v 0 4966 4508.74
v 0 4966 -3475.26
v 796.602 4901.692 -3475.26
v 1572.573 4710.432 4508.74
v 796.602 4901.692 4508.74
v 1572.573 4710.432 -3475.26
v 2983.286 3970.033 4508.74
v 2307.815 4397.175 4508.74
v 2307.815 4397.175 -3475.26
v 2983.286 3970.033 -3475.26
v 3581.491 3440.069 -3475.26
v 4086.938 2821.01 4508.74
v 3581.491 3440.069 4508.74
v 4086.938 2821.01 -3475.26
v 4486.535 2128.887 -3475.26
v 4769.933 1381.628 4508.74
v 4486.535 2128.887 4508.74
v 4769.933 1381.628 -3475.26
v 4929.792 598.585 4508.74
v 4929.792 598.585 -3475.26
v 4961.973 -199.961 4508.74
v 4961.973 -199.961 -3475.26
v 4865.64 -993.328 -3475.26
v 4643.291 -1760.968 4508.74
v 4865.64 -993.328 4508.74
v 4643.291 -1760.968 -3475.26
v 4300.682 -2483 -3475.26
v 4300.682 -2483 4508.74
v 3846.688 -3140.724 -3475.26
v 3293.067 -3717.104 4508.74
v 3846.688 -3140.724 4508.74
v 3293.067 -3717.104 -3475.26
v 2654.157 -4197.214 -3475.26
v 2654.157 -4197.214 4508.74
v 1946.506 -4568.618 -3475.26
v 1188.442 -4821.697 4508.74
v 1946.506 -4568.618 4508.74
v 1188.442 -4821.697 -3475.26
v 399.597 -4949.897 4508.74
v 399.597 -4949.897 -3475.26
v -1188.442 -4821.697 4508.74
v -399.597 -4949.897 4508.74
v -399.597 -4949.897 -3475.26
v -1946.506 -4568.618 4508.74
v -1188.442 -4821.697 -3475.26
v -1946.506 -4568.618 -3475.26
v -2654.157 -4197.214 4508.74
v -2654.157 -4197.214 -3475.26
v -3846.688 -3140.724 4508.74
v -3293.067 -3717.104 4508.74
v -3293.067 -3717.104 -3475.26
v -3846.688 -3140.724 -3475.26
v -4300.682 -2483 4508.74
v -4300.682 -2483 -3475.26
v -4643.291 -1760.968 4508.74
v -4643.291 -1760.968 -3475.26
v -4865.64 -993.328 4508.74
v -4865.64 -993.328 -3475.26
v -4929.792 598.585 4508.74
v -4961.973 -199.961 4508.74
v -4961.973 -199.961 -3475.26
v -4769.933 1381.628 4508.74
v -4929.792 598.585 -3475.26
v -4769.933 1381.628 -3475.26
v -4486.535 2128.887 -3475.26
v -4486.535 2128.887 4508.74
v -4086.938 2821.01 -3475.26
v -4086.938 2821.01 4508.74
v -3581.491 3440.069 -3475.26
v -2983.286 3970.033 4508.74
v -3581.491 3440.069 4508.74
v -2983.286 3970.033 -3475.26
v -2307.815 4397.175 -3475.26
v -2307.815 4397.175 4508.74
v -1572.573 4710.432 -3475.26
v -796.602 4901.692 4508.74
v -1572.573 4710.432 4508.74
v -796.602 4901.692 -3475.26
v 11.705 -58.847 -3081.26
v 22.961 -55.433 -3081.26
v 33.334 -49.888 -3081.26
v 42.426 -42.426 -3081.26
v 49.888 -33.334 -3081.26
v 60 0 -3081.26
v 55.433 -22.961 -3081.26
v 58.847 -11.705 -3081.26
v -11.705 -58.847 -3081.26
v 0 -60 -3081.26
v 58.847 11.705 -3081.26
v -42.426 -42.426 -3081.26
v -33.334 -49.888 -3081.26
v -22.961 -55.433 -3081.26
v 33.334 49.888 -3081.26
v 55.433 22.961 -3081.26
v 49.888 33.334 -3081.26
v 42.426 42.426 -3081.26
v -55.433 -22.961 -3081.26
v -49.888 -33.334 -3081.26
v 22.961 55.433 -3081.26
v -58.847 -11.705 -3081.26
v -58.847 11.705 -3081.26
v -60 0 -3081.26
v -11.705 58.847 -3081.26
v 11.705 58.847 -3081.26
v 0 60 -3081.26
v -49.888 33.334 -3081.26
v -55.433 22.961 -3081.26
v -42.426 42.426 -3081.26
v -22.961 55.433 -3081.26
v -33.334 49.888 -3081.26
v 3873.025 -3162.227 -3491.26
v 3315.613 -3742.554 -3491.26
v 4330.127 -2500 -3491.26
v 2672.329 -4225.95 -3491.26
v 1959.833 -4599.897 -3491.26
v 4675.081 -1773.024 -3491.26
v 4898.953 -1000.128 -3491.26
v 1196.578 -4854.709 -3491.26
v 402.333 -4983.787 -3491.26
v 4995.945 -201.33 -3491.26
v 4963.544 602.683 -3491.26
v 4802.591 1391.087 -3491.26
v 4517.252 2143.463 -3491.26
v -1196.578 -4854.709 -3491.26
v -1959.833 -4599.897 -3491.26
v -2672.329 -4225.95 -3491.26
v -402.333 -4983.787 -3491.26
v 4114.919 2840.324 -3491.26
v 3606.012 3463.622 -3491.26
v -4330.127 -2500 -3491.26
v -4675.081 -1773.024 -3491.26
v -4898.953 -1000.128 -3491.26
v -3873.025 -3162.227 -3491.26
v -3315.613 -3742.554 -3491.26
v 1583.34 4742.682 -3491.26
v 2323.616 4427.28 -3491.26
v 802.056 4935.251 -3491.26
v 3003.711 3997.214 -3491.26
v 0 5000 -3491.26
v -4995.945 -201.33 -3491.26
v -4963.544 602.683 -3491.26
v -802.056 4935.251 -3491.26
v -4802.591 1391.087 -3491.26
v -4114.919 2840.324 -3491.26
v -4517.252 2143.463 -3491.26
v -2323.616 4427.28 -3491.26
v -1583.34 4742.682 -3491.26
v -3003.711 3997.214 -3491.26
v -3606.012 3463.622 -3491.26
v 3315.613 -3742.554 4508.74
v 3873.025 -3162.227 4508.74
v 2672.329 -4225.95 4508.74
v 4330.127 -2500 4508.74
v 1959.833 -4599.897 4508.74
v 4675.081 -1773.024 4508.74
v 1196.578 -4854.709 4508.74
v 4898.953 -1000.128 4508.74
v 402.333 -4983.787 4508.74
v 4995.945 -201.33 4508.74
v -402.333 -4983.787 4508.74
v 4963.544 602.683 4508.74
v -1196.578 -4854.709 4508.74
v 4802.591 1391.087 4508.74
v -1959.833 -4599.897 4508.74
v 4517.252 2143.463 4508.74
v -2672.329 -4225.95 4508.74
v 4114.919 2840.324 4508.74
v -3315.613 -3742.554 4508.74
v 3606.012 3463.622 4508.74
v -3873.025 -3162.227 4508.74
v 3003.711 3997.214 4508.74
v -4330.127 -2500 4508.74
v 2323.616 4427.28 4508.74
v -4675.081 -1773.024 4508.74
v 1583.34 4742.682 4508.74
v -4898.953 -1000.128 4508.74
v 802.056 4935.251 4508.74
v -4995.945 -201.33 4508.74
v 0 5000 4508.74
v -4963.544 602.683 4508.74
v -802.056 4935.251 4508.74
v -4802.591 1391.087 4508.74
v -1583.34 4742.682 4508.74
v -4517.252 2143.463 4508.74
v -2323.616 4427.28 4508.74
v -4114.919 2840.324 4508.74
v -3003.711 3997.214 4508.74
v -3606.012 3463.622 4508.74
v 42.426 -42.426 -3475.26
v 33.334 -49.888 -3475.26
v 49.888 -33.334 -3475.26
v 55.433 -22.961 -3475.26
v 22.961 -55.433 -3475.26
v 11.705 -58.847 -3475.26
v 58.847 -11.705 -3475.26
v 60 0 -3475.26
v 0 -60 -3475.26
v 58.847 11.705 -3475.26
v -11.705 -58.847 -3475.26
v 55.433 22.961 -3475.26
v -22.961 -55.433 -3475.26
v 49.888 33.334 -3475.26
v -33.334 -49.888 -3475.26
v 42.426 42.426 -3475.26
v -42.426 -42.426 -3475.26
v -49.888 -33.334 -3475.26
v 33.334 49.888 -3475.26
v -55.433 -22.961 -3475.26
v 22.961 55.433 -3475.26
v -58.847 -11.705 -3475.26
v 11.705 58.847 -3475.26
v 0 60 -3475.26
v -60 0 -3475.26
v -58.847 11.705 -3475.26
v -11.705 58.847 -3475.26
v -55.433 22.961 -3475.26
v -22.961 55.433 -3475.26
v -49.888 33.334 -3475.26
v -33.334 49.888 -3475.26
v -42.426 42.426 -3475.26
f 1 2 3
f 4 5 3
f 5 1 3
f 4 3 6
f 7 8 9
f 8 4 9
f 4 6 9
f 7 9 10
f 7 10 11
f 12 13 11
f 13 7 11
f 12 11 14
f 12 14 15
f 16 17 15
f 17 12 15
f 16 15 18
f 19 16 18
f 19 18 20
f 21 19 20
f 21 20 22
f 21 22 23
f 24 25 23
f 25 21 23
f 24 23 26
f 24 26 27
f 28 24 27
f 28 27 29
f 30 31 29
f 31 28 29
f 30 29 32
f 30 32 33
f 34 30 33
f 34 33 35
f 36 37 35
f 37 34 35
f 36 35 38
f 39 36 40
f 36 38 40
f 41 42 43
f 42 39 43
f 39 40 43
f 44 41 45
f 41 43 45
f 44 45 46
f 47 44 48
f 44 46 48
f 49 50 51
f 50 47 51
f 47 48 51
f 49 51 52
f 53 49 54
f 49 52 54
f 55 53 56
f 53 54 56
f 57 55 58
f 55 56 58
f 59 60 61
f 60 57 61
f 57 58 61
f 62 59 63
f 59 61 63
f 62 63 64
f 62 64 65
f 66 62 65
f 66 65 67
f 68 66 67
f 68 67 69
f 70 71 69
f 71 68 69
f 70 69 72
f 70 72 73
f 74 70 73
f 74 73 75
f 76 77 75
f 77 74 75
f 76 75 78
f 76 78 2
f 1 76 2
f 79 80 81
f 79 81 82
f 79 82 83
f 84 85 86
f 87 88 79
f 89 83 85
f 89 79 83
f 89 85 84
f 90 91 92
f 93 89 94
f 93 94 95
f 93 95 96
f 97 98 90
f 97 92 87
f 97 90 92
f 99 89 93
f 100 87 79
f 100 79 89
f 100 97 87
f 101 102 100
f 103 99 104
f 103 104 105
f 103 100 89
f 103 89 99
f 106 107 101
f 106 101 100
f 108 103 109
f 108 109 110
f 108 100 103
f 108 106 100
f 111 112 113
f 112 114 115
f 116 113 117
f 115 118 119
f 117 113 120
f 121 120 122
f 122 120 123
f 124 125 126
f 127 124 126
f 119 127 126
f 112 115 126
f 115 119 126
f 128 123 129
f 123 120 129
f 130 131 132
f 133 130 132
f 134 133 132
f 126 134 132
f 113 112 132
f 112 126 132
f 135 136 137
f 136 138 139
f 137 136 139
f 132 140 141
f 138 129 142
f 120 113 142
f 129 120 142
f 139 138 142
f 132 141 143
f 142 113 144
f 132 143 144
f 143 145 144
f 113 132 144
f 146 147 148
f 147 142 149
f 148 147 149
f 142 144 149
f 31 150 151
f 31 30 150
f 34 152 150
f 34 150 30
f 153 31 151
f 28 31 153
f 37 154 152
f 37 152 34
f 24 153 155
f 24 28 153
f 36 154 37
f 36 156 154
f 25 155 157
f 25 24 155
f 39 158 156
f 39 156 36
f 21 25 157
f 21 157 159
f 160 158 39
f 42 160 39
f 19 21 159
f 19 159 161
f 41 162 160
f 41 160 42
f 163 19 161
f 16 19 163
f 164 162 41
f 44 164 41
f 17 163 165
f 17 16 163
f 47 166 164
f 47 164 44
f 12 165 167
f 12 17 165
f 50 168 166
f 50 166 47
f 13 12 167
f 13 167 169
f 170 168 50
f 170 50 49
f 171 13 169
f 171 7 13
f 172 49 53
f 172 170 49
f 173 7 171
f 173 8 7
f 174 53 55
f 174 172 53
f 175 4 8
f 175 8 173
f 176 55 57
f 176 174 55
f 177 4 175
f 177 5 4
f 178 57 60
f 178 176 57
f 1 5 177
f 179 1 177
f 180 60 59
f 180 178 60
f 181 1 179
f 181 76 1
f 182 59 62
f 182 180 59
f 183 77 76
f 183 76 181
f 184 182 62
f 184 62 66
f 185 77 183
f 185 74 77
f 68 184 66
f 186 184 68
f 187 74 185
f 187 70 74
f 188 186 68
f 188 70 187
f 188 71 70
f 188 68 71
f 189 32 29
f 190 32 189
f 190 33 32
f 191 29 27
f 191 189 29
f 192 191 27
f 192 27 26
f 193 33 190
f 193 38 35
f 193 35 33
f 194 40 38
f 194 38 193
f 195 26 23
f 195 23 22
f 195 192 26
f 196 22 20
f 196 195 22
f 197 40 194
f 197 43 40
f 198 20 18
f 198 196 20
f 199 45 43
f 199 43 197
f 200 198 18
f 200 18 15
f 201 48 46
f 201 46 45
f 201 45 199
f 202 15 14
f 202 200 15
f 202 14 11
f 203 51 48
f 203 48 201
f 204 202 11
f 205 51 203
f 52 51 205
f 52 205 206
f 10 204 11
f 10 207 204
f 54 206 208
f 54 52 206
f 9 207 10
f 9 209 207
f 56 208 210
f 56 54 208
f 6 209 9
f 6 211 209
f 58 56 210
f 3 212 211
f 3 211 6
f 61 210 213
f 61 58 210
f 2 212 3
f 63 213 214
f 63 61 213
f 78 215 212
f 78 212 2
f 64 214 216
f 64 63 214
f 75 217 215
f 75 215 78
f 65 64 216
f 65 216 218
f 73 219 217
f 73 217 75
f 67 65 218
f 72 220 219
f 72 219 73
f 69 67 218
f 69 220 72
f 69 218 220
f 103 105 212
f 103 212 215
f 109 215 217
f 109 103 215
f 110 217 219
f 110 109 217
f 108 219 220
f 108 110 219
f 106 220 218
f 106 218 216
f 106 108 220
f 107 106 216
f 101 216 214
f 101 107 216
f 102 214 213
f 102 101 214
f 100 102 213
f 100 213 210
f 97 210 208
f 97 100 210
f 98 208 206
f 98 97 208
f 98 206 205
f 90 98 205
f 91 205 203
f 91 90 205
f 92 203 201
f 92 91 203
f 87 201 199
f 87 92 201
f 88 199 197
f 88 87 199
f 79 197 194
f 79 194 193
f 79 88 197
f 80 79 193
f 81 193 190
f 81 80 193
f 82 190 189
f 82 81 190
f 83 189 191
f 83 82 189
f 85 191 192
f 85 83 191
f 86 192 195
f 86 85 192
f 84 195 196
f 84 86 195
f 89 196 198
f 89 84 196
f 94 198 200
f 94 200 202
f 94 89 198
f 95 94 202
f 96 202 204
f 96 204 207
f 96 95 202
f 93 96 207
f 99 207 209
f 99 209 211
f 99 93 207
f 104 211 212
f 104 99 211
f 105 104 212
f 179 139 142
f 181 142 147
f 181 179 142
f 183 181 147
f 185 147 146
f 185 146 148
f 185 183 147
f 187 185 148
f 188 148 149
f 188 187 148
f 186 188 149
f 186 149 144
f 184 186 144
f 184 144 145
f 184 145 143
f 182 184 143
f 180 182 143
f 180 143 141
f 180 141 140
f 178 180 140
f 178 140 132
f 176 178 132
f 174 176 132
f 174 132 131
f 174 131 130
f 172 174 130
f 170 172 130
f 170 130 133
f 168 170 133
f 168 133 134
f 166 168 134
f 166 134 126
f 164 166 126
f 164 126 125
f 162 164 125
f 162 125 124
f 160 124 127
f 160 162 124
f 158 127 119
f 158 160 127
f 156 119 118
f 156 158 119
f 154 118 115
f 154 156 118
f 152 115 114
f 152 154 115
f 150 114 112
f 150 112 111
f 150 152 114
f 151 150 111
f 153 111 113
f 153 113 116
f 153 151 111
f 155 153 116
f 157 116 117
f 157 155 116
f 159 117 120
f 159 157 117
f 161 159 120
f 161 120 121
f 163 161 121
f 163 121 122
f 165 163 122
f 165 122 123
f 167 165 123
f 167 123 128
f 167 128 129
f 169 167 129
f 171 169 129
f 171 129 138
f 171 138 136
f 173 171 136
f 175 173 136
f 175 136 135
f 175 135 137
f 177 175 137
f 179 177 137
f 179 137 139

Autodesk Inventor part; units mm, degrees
ref_plane "YZ Plane" through (0, 0, 0) normal (1, 0, 0) x (0, 1, 0)
ref_plane "XZ Plane" through (0, 0, 0) normal (0, 1, 0) x (-1, 0, 0)
ref_plane "XY Plane" through (0, 0, 0) normal (0, 0, 1) x (1, 0, 0)
sketch "Sketch2" plane through (0, 0, 0) normal (1, 0, 0) x (0, 1, 0)
  line L0 (0, -3081.26) -> (0, -3491.26)
  line L1 (0, -3491.26) -> (5000, -3491.26)
  line L2 (5000, -3491.26) -> (5000, 4508.74)
  line L3 (5000, 4508.74) -> (4966, 4508.74)
  line L4 (4966, 4508.74) -> (4966, -3475.26)
  line L5 (4966, -3475.26) -> (60, -3475.26)
  line L6 (60, -3475.26) -> (60, -3081.26)
  line L7 (60, -3081.26) -> (0, -3081.26)
  line L8 (0, -5091.26) -> (0, 6108.74) projected
  line L9 (-1000, 0) -> (6000, 0) projected
  point P0 (0, 0)
  dimension "d0" = 8000
  dimension "d1" = 410
  dimension "d2" = 7984
  dimension "d3" = 60
  dimension "d4" = 34
  dimension "d5" = 16
  dimension "d6" = 5000
  dimension "d7" = 0
  dimension "d10" = 3475.26
revolve "Revolution1" add sketch "Sketch2" angle 360 about axis through (0, 0, -10) along (0, 0, 1) contours L7 L6 L5 L4 L9 L2 L1 L0 | L4 L3 L2 L9
properties part number "BasicBuoy" material "Steel"
